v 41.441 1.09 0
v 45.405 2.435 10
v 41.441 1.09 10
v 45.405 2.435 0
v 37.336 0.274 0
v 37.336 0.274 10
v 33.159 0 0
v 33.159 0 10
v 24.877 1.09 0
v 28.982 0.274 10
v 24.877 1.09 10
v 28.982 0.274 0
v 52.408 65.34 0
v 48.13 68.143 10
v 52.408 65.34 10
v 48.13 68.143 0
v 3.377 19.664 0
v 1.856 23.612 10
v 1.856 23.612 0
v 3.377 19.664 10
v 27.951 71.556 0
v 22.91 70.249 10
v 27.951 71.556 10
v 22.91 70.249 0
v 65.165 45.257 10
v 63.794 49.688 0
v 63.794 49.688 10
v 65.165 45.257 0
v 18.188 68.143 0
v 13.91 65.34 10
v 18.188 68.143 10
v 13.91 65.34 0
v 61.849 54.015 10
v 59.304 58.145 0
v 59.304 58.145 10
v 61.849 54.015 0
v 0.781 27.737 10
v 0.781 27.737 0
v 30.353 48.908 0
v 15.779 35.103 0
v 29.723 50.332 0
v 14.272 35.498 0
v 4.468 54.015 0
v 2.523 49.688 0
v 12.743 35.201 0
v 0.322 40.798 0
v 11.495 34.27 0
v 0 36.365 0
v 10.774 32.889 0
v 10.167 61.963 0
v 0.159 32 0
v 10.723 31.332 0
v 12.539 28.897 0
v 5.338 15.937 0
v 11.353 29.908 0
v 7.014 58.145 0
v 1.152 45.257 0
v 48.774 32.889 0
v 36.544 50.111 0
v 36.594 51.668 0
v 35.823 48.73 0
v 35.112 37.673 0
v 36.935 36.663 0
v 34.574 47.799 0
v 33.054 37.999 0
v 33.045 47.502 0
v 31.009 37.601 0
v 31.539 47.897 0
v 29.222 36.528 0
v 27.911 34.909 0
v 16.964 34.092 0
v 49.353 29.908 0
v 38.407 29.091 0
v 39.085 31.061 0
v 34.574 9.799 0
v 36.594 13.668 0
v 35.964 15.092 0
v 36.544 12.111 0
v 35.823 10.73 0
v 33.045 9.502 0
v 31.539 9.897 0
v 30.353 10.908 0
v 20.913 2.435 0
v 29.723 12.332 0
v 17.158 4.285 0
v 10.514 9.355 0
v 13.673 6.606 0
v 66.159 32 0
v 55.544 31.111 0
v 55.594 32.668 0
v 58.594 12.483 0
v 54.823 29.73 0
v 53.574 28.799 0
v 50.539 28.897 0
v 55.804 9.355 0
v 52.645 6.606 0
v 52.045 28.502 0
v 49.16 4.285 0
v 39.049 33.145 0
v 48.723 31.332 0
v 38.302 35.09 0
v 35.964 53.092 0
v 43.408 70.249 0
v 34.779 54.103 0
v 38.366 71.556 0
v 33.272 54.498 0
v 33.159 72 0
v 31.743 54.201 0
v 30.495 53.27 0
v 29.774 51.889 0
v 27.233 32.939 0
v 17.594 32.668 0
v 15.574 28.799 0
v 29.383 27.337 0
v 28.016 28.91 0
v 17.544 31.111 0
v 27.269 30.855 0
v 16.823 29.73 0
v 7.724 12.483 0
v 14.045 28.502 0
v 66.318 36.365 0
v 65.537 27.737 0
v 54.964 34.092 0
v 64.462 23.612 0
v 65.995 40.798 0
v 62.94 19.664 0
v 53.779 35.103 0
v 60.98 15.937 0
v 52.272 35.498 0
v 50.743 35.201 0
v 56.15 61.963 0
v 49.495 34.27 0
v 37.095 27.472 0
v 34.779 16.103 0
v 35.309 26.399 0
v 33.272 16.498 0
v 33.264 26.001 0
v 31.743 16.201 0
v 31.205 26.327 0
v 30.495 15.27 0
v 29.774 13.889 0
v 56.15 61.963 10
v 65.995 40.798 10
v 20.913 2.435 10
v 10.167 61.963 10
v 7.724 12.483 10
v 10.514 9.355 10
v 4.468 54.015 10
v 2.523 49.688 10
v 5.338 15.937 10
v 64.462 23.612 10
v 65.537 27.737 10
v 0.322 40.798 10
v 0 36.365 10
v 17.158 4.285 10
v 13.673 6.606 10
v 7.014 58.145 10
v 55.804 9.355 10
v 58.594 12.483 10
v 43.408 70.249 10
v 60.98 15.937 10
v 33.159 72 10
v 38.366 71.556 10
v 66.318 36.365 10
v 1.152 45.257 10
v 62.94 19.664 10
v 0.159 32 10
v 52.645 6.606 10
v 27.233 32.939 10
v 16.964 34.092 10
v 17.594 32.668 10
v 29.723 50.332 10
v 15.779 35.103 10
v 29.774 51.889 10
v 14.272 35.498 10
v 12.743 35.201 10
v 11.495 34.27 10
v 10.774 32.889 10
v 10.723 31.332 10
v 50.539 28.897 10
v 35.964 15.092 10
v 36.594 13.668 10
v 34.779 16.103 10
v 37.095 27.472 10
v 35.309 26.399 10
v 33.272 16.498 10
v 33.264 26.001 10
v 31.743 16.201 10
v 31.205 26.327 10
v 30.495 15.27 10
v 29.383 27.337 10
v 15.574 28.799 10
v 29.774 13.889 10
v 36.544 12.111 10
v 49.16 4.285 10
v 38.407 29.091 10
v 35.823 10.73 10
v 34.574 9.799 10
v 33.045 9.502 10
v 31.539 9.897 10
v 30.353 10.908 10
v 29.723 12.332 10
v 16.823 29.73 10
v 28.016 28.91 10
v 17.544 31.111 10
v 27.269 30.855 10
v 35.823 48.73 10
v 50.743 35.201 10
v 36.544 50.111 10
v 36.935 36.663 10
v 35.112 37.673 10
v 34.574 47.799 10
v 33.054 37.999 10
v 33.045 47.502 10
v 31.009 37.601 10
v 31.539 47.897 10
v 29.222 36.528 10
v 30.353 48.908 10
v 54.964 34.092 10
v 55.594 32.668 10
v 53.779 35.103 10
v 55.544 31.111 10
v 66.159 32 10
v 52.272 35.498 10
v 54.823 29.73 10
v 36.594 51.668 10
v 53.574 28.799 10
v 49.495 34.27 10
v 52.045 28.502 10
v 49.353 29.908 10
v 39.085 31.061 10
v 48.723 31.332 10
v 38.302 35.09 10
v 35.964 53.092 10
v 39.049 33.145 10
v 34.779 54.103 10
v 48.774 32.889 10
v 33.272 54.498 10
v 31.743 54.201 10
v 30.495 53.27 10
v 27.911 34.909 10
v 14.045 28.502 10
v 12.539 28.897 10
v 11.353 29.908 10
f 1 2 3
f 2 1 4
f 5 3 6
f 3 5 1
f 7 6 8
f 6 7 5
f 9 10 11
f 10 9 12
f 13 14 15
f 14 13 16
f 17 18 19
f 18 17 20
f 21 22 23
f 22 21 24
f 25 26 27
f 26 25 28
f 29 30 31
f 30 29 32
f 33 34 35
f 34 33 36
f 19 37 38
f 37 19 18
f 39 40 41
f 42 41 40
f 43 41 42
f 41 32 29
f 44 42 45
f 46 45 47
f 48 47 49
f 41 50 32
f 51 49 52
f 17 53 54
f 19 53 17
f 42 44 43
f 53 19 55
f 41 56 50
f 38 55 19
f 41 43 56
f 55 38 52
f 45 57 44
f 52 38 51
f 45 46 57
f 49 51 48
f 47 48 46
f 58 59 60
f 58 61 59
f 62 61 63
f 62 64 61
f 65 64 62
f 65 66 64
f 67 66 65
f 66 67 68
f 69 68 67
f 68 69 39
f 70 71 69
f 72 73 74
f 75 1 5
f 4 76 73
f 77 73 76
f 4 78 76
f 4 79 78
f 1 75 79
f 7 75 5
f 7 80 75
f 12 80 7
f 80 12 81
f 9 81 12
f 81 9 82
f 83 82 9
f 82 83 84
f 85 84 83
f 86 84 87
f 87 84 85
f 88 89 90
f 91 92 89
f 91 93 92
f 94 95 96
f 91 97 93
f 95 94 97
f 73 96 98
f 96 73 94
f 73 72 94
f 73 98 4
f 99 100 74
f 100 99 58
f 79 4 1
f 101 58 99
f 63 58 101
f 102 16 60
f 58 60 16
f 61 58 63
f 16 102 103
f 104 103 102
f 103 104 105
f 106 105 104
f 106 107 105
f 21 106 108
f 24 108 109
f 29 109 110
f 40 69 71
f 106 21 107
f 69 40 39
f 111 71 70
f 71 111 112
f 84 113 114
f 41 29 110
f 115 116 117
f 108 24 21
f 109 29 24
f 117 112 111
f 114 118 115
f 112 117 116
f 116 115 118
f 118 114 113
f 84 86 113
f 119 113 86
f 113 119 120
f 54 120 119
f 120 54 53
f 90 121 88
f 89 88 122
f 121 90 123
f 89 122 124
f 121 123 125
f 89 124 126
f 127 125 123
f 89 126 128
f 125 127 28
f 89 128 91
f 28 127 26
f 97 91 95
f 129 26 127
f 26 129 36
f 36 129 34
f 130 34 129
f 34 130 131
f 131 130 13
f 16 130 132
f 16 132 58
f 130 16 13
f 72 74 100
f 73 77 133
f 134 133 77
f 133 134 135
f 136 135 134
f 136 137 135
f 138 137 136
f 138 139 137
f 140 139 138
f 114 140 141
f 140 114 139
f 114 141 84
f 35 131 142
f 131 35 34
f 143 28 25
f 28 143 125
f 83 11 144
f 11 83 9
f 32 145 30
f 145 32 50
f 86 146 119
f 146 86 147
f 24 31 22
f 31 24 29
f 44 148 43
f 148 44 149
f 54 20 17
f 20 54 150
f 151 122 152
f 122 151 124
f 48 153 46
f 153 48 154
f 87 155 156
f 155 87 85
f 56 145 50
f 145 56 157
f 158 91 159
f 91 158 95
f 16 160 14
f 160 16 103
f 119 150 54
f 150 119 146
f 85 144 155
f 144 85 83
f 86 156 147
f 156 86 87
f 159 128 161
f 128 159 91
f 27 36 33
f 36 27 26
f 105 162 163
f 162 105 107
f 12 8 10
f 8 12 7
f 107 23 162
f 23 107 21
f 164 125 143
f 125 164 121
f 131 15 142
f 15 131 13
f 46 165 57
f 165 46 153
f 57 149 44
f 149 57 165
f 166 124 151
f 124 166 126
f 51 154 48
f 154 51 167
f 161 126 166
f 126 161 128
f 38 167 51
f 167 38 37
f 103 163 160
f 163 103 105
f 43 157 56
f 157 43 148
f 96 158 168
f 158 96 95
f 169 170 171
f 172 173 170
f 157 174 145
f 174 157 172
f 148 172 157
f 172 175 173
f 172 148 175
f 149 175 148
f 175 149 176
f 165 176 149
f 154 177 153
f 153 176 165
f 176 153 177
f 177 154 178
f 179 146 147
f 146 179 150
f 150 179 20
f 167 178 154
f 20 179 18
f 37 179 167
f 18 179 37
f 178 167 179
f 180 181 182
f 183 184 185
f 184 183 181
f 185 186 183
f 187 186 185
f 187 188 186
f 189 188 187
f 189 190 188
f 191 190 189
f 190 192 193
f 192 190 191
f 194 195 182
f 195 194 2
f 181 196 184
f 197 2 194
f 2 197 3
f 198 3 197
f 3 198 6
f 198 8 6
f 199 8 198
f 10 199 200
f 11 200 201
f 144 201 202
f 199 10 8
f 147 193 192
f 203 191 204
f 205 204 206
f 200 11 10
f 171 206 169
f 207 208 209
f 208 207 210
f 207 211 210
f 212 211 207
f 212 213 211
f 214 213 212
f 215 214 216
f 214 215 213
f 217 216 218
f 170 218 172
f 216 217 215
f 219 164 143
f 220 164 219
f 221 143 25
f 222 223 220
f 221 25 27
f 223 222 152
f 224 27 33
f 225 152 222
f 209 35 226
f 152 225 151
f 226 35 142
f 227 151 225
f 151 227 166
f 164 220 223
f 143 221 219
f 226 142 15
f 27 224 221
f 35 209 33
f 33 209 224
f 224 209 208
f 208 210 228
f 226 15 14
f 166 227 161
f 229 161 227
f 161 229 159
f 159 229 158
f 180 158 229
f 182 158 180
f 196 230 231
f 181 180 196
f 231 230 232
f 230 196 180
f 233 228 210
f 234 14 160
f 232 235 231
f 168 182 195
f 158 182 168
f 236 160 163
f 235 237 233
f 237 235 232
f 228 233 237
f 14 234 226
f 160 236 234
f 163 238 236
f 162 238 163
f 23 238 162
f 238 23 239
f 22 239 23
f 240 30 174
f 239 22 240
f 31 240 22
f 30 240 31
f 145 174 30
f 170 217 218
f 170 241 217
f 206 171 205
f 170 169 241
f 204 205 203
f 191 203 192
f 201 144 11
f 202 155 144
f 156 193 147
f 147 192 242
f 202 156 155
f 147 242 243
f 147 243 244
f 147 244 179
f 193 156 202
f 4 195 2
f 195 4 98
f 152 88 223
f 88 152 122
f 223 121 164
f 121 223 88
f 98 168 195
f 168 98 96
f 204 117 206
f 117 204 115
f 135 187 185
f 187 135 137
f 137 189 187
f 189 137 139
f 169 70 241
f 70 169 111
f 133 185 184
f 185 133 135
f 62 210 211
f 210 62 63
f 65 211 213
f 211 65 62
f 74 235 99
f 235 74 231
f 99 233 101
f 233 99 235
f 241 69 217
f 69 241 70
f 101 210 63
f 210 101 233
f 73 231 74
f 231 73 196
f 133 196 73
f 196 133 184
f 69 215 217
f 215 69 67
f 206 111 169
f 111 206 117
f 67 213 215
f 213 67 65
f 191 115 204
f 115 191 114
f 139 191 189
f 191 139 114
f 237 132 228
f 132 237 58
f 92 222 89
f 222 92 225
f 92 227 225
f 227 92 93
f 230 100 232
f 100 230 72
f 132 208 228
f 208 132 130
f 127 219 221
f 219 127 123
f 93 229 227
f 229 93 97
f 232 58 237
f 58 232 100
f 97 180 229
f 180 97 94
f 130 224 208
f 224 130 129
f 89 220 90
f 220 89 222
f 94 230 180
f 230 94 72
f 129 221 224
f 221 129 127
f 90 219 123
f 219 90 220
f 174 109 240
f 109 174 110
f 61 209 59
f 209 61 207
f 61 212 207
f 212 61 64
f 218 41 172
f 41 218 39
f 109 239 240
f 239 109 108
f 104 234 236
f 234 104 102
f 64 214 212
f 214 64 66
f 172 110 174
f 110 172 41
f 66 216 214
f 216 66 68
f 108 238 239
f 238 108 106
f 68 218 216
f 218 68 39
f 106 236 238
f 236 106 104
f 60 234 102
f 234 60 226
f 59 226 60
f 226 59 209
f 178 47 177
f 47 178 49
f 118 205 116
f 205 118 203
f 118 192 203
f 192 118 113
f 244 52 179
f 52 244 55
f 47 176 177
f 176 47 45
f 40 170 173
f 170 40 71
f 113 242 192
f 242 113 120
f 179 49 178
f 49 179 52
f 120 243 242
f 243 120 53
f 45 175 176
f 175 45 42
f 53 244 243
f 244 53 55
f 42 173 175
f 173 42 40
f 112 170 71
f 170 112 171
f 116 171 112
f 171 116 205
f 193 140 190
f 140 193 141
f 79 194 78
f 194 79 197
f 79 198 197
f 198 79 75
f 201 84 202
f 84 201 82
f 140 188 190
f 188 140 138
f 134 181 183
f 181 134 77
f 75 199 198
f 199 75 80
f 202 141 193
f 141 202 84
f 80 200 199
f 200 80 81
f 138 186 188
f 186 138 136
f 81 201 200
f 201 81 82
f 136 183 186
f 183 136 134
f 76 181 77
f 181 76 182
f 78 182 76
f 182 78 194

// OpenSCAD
$fn = 32;

// ----------------------------------------------------------------------
// Cam plate: single_lobe cam, base R32
// ----------------------------------------------------------------------

// --- parameters (mm) ---
base_r = 32;              // base circle radius
lobe_h = 8;               // cam lobe rise
bore_r = 6;               // shaft bore radius
plate_t = 10;             // plate thickness, Z (extrusion height)
ring_r = 19;              // lightening ring radius
bolt_r = 3.5;             // lightening hole radius
fit_tol = 0.05;           // declared fit tolerance (prompt contract)
free_tol = 0.3;           // declared free tolerance (prompt contract)

profile = [[66.159, 32], [66.318, 36.365], [65.995, 40.798], [65.165, 45.257], [63.794, 49.688], [61.849, 54.015], [59.304, 58.145], [56.15, 61.963], [52.408, 65.34], [48.13, 68.143], [43.408, 70.249], [38.366, 71.556], [33.159, 72], [27.951, 71.556], [22.91, 70.249], [18.188, 68.143], [13.91, 65.34], [10.167, 61.963], [7.014, 58.145], [4.468, 54.015], [2.523, 49.688], [1.152, 45.257], [0.322, 40.798], [0, 36.365], [0.159, 32], [0.781, 27.737], [1.856, 23.612], [3.377, 19.664], [5.338, 15.937], [7.724, 12.483], [10.514, 9.355], [13.673, 6.606], [17.158, 4.285], [20.913, 2.435], [24.877, 1.09], [28.982, 0.274], [33.159, 0], [37.336, 0.274], [41.441, 1.09], [45.405, 2.435], [49.16, 4.285], [52.645, 6.606], [55.804, 9.355], [58.594, 12.483], [60.98, 15.937], [62.94, 19.664], [64.462, 23.612], [65.537, 27.737]];  // primary outline, 48 points, counter clockwise
void_1 = [[39.049, 33.145], [38.302, 35.09], [36.935, 36.663], [35.112, 37.673], [33.054, 37.999], [31.009, 37.601], [29.222, 36.528], [27.911, 34.909], [27.233, 32.939], [27.269, 30.855], [28.016, 28.91], [29.383, 27.337], [31.205, 26.327], [33.264, 26.001], [35.309, 26.399], [37.095, 27.472], [38.407, 29.091], [39.085, 31.061]];  // shaft bore, 18 points
void_2 = [[55.594, 32.668], [54.964, 34.092], [53.779, 35.103], [52.272, 35.498], [50.743, 35.201], [49.495, 34.27], [48.774, 32.889], [48.723, 31.332], [49.353, 29.908], [50.539, 28.897], [52.045, 28.502], [53.574, 28.799], [54.823, 29.73], [55.544, 31.111]];  // lightening hole 1, 14 points
void_3 = [[36.594, 51.668], [35.964, 53.092], [34.779, 54.103], [33.272, 54.498], [31.743, 54.201], [30.495, 53.27], [29.774, 51.889], [29.723, 50.332], [30.353, 48.908], [31.539, 47.897], [33.045, 47.502], [34.574, 47.799], [35.823, 48.73], [36.544, 50.111]];  // lightening hole 2, 14 points
void_4 = [[17.594, 32.668], [16.964, 34.092], [15.779, 35.103], [14.272, 35.498], [12.743, 35.201], [11.495, 34.27], [10.774, 32.889], [10.723, 31.332], [11.353, 29.908], [12.539, 28.897], [14.045, 28.502], [15.574, 28.799], [16.823, 29.73], [17.544, 31.111]];  // lightening hole 3, 14 points
void_5 = [[36.594, 13.668], [35.964, 15.092], [34.779, 16.103], [33.272, 16.498], [31.743, 16.201], [30.495, 15.27], [29.774, 13.889], [29.723, 12.332], [30.353, 10.908], [31.539, 9.897], [33.045, 9.502], [34.574, 9.799], [35.823, 10.73], [36.544, 12.111]];  // lightening hole 4, 14 points

// --- the one profile operation ---
difference() {
  linear_extrude(height = plate_t) polygon(points = profile);
  translate([0, 0, -1])
    linear_extrude(height = plate_t + 2) polygon(points = void_1);
  translate([0, 0, -1])
    linear_extrude(height = plate_t + 2) polygon(points = void_2);
  translate([0, 0, -1])
    linear_extrude(height = plate_t + 2) polygon(points = void_3);
  translate([0, 0, -1])
    linear_extrude(height = plate_t + 2) polygon(points = void_4);
  translate([0, 0, -1])
    linear_extrude(height = plate_t + 2) polygon(points = void_5);
}
